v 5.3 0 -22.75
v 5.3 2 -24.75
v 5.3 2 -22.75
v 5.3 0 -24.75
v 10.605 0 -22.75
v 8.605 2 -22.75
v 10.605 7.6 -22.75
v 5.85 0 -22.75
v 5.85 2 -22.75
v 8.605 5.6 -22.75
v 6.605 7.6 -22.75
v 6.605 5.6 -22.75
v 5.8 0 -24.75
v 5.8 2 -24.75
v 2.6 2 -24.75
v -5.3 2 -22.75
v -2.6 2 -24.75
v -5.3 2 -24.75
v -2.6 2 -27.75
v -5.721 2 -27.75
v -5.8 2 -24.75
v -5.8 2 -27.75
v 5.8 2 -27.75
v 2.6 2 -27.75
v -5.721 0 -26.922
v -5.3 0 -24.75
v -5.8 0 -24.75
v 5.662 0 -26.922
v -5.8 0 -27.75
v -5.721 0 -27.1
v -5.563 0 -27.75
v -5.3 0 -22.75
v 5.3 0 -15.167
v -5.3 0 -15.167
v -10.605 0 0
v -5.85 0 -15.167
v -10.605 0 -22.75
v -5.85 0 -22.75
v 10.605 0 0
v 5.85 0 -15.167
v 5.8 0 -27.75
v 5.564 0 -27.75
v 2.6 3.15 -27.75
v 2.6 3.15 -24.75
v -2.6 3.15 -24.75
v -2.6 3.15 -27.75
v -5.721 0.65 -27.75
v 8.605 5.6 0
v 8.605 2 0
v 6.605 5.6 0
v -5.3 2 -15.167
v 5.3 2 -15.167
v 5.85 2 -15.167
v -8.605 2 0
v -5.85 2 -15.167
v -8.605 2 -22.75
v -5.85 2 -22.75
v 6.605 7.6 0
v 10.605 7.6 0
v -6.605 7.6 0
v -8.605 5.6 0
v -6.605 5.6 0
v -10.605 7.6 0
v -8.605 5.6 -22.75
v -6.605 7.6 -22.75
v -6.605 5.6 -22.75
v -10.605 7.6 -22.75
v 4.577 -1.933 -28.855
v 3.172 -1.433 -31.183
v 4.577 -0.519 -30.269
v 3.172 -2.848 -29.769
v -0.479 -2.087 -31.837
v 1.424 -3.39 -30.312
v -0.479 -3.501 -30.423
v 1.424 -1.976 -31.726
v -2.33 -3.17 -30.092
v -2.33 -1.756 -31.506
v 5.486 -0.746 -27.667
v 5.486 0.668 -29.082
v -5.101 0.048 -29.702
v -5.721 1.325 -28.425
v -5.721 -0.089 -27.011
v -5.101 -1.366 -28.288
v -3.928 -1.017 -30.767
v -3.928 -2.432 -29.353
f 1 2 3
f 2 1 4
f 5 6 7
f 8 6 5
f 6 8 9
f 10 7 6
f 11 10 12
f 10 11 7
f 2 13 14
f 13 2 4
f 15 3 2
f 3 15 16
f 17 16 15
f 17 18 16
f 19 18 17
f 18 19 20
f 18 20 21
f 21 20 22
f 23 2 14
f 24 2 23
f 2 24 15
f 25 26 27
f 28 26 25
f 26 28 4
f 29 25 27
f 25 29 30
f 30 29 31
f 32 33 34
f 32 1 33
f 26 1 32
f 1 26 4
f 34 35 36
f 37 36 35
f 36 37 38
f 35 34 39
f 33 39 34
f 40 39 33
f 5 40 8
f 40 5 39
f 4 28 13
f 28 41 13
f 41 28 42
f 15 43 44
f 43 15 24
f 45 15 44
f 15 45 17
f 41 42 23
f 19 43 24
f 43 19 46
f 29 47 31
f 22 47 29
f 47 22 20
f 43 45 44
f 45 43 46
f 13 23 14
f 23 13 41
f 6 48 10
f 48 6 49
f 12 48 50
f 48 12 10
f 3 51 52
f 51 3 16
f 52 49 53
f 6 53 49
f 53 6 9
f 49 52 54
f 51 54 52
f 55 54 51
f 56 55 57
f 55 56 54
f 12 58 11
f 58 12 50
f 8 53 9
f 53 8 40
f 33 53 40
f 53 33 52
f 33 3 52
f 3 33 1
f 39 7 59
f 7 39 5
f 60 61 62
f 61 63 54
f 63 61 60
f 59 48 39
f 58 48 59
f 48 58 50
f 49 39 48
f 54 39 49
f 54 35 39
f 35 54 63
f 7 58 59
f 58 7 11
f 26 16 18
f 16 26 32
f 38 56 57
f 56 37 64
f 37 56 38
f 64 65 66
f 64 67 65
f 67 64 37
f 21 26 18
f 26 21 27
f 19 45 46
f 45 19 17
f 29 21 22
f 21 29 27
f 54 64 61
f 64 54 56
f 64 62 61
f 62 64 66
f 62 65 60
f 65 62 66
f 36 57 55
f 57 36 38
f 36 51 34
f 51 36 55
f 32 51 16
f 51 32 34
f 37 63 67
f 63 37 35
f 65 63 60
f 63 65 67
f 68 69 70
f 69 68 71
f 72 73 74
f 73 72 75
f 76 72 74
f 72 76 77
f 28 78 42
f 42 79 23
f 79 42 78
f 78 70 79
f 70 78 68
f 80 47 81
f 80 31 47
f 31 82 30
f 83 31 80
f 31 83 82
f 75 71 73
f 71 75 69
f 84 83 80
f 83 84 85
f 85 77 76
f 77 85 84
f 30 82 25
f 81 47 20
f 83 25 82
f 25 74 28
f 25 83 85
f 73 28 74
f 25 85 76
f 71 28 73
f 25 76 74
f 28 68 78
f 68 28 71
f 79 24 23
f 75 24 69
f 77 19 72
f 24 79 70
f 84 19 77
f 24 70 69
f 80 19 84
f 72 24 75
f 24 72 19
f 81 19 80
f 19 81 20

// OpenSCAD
// preview[view:southwest, tilt:bottomdiagonal]

/* [holder chinese laser] */

// min width of the plastic walls.
wall = 2; // plastic walls are 2mm

// we will model the whole thing based on the hole in the middle, since that is all we care about. It should be the measured from the male part on the bike light you want to attach here.
innerWidth = 17.21; // the side to side of the shaft
innerDepth = 3.6; // the depth the shaft
// height does not matter much for the male part, as it will pass trhu the whole part. So just enter a good height so that it reaches the latch on the bottom.
partHeight = 22.75;
// width of the thumb thing for the latch
handle_width = 11.6;

module main_part(){
	latch();
	difference(){
		// the main block where we will chip the pieces away
		cube([ innerWidth/2 + wall, innerDepth+wall*2 , partHeight] );
		main_cuts();
	}
}
module latch(){
	// bottom latch
	translate([ 0, 0, -wall ] ){
		cube( [ handle_width/2 -0.5, wall, wall] );
	}
	// the latching block
	translate([ 0, wall, -3-wall ] ){
		cube( [ 5.20/2, 1.15, 3] );
	}
	// the lachking block base
	translate([ 0, 0, -3-wall ] ){
		cube( [ handle_width/2, wall, 3] );
	}
	//handle();
}
module handle(){
	// the handle
	translate([ 0, wall, -3-wall ] ){
		rotate([45, 0, 0])
			difference(){
				cylinder( h=wall, r=handle_width/2);
				color("blue") rotate([0,0,90])
					translate([0, -handle_width/2-0.001,-0.001])
						cube([ handle_width/2+0.002, handle_width+0.002 , handle_width+0.002]);
			}
	}

}

module main_cuts(){
	// the inner shaft
	translate( [ -0.001, wall, -0.001] ){
		cube([ innerWidth/2+0.001, innerDepth, partHeight+0.002] );
	}
	// the front wall opening
	translate( [ -0.001, (wall)+innerDepth-0.001, -0.001] ){
		cube([ innerWidth/2-wall+0.001, wall+0.002, partHeight+0.002] );
	}
	// the two cuts on the side leading to the latch so that it can move back/forth
	translate( [ handle_width/2-0.5, -0.001, -0.001] ){
		cube([ 0.55, wall+0.002, partHeight/3+0.001]);
	}
}

main();
module main(){
	translate([0,0,-partHeight]){
		main_part();
		actual_mirror();
		handle();
	}
}

// mirror the geometry... why the fuck mirror does not copy? that way it is just an alias to rotate()
module actual_mirror(){
	mirror([10,0,0]){
		main_part();
	}
}
